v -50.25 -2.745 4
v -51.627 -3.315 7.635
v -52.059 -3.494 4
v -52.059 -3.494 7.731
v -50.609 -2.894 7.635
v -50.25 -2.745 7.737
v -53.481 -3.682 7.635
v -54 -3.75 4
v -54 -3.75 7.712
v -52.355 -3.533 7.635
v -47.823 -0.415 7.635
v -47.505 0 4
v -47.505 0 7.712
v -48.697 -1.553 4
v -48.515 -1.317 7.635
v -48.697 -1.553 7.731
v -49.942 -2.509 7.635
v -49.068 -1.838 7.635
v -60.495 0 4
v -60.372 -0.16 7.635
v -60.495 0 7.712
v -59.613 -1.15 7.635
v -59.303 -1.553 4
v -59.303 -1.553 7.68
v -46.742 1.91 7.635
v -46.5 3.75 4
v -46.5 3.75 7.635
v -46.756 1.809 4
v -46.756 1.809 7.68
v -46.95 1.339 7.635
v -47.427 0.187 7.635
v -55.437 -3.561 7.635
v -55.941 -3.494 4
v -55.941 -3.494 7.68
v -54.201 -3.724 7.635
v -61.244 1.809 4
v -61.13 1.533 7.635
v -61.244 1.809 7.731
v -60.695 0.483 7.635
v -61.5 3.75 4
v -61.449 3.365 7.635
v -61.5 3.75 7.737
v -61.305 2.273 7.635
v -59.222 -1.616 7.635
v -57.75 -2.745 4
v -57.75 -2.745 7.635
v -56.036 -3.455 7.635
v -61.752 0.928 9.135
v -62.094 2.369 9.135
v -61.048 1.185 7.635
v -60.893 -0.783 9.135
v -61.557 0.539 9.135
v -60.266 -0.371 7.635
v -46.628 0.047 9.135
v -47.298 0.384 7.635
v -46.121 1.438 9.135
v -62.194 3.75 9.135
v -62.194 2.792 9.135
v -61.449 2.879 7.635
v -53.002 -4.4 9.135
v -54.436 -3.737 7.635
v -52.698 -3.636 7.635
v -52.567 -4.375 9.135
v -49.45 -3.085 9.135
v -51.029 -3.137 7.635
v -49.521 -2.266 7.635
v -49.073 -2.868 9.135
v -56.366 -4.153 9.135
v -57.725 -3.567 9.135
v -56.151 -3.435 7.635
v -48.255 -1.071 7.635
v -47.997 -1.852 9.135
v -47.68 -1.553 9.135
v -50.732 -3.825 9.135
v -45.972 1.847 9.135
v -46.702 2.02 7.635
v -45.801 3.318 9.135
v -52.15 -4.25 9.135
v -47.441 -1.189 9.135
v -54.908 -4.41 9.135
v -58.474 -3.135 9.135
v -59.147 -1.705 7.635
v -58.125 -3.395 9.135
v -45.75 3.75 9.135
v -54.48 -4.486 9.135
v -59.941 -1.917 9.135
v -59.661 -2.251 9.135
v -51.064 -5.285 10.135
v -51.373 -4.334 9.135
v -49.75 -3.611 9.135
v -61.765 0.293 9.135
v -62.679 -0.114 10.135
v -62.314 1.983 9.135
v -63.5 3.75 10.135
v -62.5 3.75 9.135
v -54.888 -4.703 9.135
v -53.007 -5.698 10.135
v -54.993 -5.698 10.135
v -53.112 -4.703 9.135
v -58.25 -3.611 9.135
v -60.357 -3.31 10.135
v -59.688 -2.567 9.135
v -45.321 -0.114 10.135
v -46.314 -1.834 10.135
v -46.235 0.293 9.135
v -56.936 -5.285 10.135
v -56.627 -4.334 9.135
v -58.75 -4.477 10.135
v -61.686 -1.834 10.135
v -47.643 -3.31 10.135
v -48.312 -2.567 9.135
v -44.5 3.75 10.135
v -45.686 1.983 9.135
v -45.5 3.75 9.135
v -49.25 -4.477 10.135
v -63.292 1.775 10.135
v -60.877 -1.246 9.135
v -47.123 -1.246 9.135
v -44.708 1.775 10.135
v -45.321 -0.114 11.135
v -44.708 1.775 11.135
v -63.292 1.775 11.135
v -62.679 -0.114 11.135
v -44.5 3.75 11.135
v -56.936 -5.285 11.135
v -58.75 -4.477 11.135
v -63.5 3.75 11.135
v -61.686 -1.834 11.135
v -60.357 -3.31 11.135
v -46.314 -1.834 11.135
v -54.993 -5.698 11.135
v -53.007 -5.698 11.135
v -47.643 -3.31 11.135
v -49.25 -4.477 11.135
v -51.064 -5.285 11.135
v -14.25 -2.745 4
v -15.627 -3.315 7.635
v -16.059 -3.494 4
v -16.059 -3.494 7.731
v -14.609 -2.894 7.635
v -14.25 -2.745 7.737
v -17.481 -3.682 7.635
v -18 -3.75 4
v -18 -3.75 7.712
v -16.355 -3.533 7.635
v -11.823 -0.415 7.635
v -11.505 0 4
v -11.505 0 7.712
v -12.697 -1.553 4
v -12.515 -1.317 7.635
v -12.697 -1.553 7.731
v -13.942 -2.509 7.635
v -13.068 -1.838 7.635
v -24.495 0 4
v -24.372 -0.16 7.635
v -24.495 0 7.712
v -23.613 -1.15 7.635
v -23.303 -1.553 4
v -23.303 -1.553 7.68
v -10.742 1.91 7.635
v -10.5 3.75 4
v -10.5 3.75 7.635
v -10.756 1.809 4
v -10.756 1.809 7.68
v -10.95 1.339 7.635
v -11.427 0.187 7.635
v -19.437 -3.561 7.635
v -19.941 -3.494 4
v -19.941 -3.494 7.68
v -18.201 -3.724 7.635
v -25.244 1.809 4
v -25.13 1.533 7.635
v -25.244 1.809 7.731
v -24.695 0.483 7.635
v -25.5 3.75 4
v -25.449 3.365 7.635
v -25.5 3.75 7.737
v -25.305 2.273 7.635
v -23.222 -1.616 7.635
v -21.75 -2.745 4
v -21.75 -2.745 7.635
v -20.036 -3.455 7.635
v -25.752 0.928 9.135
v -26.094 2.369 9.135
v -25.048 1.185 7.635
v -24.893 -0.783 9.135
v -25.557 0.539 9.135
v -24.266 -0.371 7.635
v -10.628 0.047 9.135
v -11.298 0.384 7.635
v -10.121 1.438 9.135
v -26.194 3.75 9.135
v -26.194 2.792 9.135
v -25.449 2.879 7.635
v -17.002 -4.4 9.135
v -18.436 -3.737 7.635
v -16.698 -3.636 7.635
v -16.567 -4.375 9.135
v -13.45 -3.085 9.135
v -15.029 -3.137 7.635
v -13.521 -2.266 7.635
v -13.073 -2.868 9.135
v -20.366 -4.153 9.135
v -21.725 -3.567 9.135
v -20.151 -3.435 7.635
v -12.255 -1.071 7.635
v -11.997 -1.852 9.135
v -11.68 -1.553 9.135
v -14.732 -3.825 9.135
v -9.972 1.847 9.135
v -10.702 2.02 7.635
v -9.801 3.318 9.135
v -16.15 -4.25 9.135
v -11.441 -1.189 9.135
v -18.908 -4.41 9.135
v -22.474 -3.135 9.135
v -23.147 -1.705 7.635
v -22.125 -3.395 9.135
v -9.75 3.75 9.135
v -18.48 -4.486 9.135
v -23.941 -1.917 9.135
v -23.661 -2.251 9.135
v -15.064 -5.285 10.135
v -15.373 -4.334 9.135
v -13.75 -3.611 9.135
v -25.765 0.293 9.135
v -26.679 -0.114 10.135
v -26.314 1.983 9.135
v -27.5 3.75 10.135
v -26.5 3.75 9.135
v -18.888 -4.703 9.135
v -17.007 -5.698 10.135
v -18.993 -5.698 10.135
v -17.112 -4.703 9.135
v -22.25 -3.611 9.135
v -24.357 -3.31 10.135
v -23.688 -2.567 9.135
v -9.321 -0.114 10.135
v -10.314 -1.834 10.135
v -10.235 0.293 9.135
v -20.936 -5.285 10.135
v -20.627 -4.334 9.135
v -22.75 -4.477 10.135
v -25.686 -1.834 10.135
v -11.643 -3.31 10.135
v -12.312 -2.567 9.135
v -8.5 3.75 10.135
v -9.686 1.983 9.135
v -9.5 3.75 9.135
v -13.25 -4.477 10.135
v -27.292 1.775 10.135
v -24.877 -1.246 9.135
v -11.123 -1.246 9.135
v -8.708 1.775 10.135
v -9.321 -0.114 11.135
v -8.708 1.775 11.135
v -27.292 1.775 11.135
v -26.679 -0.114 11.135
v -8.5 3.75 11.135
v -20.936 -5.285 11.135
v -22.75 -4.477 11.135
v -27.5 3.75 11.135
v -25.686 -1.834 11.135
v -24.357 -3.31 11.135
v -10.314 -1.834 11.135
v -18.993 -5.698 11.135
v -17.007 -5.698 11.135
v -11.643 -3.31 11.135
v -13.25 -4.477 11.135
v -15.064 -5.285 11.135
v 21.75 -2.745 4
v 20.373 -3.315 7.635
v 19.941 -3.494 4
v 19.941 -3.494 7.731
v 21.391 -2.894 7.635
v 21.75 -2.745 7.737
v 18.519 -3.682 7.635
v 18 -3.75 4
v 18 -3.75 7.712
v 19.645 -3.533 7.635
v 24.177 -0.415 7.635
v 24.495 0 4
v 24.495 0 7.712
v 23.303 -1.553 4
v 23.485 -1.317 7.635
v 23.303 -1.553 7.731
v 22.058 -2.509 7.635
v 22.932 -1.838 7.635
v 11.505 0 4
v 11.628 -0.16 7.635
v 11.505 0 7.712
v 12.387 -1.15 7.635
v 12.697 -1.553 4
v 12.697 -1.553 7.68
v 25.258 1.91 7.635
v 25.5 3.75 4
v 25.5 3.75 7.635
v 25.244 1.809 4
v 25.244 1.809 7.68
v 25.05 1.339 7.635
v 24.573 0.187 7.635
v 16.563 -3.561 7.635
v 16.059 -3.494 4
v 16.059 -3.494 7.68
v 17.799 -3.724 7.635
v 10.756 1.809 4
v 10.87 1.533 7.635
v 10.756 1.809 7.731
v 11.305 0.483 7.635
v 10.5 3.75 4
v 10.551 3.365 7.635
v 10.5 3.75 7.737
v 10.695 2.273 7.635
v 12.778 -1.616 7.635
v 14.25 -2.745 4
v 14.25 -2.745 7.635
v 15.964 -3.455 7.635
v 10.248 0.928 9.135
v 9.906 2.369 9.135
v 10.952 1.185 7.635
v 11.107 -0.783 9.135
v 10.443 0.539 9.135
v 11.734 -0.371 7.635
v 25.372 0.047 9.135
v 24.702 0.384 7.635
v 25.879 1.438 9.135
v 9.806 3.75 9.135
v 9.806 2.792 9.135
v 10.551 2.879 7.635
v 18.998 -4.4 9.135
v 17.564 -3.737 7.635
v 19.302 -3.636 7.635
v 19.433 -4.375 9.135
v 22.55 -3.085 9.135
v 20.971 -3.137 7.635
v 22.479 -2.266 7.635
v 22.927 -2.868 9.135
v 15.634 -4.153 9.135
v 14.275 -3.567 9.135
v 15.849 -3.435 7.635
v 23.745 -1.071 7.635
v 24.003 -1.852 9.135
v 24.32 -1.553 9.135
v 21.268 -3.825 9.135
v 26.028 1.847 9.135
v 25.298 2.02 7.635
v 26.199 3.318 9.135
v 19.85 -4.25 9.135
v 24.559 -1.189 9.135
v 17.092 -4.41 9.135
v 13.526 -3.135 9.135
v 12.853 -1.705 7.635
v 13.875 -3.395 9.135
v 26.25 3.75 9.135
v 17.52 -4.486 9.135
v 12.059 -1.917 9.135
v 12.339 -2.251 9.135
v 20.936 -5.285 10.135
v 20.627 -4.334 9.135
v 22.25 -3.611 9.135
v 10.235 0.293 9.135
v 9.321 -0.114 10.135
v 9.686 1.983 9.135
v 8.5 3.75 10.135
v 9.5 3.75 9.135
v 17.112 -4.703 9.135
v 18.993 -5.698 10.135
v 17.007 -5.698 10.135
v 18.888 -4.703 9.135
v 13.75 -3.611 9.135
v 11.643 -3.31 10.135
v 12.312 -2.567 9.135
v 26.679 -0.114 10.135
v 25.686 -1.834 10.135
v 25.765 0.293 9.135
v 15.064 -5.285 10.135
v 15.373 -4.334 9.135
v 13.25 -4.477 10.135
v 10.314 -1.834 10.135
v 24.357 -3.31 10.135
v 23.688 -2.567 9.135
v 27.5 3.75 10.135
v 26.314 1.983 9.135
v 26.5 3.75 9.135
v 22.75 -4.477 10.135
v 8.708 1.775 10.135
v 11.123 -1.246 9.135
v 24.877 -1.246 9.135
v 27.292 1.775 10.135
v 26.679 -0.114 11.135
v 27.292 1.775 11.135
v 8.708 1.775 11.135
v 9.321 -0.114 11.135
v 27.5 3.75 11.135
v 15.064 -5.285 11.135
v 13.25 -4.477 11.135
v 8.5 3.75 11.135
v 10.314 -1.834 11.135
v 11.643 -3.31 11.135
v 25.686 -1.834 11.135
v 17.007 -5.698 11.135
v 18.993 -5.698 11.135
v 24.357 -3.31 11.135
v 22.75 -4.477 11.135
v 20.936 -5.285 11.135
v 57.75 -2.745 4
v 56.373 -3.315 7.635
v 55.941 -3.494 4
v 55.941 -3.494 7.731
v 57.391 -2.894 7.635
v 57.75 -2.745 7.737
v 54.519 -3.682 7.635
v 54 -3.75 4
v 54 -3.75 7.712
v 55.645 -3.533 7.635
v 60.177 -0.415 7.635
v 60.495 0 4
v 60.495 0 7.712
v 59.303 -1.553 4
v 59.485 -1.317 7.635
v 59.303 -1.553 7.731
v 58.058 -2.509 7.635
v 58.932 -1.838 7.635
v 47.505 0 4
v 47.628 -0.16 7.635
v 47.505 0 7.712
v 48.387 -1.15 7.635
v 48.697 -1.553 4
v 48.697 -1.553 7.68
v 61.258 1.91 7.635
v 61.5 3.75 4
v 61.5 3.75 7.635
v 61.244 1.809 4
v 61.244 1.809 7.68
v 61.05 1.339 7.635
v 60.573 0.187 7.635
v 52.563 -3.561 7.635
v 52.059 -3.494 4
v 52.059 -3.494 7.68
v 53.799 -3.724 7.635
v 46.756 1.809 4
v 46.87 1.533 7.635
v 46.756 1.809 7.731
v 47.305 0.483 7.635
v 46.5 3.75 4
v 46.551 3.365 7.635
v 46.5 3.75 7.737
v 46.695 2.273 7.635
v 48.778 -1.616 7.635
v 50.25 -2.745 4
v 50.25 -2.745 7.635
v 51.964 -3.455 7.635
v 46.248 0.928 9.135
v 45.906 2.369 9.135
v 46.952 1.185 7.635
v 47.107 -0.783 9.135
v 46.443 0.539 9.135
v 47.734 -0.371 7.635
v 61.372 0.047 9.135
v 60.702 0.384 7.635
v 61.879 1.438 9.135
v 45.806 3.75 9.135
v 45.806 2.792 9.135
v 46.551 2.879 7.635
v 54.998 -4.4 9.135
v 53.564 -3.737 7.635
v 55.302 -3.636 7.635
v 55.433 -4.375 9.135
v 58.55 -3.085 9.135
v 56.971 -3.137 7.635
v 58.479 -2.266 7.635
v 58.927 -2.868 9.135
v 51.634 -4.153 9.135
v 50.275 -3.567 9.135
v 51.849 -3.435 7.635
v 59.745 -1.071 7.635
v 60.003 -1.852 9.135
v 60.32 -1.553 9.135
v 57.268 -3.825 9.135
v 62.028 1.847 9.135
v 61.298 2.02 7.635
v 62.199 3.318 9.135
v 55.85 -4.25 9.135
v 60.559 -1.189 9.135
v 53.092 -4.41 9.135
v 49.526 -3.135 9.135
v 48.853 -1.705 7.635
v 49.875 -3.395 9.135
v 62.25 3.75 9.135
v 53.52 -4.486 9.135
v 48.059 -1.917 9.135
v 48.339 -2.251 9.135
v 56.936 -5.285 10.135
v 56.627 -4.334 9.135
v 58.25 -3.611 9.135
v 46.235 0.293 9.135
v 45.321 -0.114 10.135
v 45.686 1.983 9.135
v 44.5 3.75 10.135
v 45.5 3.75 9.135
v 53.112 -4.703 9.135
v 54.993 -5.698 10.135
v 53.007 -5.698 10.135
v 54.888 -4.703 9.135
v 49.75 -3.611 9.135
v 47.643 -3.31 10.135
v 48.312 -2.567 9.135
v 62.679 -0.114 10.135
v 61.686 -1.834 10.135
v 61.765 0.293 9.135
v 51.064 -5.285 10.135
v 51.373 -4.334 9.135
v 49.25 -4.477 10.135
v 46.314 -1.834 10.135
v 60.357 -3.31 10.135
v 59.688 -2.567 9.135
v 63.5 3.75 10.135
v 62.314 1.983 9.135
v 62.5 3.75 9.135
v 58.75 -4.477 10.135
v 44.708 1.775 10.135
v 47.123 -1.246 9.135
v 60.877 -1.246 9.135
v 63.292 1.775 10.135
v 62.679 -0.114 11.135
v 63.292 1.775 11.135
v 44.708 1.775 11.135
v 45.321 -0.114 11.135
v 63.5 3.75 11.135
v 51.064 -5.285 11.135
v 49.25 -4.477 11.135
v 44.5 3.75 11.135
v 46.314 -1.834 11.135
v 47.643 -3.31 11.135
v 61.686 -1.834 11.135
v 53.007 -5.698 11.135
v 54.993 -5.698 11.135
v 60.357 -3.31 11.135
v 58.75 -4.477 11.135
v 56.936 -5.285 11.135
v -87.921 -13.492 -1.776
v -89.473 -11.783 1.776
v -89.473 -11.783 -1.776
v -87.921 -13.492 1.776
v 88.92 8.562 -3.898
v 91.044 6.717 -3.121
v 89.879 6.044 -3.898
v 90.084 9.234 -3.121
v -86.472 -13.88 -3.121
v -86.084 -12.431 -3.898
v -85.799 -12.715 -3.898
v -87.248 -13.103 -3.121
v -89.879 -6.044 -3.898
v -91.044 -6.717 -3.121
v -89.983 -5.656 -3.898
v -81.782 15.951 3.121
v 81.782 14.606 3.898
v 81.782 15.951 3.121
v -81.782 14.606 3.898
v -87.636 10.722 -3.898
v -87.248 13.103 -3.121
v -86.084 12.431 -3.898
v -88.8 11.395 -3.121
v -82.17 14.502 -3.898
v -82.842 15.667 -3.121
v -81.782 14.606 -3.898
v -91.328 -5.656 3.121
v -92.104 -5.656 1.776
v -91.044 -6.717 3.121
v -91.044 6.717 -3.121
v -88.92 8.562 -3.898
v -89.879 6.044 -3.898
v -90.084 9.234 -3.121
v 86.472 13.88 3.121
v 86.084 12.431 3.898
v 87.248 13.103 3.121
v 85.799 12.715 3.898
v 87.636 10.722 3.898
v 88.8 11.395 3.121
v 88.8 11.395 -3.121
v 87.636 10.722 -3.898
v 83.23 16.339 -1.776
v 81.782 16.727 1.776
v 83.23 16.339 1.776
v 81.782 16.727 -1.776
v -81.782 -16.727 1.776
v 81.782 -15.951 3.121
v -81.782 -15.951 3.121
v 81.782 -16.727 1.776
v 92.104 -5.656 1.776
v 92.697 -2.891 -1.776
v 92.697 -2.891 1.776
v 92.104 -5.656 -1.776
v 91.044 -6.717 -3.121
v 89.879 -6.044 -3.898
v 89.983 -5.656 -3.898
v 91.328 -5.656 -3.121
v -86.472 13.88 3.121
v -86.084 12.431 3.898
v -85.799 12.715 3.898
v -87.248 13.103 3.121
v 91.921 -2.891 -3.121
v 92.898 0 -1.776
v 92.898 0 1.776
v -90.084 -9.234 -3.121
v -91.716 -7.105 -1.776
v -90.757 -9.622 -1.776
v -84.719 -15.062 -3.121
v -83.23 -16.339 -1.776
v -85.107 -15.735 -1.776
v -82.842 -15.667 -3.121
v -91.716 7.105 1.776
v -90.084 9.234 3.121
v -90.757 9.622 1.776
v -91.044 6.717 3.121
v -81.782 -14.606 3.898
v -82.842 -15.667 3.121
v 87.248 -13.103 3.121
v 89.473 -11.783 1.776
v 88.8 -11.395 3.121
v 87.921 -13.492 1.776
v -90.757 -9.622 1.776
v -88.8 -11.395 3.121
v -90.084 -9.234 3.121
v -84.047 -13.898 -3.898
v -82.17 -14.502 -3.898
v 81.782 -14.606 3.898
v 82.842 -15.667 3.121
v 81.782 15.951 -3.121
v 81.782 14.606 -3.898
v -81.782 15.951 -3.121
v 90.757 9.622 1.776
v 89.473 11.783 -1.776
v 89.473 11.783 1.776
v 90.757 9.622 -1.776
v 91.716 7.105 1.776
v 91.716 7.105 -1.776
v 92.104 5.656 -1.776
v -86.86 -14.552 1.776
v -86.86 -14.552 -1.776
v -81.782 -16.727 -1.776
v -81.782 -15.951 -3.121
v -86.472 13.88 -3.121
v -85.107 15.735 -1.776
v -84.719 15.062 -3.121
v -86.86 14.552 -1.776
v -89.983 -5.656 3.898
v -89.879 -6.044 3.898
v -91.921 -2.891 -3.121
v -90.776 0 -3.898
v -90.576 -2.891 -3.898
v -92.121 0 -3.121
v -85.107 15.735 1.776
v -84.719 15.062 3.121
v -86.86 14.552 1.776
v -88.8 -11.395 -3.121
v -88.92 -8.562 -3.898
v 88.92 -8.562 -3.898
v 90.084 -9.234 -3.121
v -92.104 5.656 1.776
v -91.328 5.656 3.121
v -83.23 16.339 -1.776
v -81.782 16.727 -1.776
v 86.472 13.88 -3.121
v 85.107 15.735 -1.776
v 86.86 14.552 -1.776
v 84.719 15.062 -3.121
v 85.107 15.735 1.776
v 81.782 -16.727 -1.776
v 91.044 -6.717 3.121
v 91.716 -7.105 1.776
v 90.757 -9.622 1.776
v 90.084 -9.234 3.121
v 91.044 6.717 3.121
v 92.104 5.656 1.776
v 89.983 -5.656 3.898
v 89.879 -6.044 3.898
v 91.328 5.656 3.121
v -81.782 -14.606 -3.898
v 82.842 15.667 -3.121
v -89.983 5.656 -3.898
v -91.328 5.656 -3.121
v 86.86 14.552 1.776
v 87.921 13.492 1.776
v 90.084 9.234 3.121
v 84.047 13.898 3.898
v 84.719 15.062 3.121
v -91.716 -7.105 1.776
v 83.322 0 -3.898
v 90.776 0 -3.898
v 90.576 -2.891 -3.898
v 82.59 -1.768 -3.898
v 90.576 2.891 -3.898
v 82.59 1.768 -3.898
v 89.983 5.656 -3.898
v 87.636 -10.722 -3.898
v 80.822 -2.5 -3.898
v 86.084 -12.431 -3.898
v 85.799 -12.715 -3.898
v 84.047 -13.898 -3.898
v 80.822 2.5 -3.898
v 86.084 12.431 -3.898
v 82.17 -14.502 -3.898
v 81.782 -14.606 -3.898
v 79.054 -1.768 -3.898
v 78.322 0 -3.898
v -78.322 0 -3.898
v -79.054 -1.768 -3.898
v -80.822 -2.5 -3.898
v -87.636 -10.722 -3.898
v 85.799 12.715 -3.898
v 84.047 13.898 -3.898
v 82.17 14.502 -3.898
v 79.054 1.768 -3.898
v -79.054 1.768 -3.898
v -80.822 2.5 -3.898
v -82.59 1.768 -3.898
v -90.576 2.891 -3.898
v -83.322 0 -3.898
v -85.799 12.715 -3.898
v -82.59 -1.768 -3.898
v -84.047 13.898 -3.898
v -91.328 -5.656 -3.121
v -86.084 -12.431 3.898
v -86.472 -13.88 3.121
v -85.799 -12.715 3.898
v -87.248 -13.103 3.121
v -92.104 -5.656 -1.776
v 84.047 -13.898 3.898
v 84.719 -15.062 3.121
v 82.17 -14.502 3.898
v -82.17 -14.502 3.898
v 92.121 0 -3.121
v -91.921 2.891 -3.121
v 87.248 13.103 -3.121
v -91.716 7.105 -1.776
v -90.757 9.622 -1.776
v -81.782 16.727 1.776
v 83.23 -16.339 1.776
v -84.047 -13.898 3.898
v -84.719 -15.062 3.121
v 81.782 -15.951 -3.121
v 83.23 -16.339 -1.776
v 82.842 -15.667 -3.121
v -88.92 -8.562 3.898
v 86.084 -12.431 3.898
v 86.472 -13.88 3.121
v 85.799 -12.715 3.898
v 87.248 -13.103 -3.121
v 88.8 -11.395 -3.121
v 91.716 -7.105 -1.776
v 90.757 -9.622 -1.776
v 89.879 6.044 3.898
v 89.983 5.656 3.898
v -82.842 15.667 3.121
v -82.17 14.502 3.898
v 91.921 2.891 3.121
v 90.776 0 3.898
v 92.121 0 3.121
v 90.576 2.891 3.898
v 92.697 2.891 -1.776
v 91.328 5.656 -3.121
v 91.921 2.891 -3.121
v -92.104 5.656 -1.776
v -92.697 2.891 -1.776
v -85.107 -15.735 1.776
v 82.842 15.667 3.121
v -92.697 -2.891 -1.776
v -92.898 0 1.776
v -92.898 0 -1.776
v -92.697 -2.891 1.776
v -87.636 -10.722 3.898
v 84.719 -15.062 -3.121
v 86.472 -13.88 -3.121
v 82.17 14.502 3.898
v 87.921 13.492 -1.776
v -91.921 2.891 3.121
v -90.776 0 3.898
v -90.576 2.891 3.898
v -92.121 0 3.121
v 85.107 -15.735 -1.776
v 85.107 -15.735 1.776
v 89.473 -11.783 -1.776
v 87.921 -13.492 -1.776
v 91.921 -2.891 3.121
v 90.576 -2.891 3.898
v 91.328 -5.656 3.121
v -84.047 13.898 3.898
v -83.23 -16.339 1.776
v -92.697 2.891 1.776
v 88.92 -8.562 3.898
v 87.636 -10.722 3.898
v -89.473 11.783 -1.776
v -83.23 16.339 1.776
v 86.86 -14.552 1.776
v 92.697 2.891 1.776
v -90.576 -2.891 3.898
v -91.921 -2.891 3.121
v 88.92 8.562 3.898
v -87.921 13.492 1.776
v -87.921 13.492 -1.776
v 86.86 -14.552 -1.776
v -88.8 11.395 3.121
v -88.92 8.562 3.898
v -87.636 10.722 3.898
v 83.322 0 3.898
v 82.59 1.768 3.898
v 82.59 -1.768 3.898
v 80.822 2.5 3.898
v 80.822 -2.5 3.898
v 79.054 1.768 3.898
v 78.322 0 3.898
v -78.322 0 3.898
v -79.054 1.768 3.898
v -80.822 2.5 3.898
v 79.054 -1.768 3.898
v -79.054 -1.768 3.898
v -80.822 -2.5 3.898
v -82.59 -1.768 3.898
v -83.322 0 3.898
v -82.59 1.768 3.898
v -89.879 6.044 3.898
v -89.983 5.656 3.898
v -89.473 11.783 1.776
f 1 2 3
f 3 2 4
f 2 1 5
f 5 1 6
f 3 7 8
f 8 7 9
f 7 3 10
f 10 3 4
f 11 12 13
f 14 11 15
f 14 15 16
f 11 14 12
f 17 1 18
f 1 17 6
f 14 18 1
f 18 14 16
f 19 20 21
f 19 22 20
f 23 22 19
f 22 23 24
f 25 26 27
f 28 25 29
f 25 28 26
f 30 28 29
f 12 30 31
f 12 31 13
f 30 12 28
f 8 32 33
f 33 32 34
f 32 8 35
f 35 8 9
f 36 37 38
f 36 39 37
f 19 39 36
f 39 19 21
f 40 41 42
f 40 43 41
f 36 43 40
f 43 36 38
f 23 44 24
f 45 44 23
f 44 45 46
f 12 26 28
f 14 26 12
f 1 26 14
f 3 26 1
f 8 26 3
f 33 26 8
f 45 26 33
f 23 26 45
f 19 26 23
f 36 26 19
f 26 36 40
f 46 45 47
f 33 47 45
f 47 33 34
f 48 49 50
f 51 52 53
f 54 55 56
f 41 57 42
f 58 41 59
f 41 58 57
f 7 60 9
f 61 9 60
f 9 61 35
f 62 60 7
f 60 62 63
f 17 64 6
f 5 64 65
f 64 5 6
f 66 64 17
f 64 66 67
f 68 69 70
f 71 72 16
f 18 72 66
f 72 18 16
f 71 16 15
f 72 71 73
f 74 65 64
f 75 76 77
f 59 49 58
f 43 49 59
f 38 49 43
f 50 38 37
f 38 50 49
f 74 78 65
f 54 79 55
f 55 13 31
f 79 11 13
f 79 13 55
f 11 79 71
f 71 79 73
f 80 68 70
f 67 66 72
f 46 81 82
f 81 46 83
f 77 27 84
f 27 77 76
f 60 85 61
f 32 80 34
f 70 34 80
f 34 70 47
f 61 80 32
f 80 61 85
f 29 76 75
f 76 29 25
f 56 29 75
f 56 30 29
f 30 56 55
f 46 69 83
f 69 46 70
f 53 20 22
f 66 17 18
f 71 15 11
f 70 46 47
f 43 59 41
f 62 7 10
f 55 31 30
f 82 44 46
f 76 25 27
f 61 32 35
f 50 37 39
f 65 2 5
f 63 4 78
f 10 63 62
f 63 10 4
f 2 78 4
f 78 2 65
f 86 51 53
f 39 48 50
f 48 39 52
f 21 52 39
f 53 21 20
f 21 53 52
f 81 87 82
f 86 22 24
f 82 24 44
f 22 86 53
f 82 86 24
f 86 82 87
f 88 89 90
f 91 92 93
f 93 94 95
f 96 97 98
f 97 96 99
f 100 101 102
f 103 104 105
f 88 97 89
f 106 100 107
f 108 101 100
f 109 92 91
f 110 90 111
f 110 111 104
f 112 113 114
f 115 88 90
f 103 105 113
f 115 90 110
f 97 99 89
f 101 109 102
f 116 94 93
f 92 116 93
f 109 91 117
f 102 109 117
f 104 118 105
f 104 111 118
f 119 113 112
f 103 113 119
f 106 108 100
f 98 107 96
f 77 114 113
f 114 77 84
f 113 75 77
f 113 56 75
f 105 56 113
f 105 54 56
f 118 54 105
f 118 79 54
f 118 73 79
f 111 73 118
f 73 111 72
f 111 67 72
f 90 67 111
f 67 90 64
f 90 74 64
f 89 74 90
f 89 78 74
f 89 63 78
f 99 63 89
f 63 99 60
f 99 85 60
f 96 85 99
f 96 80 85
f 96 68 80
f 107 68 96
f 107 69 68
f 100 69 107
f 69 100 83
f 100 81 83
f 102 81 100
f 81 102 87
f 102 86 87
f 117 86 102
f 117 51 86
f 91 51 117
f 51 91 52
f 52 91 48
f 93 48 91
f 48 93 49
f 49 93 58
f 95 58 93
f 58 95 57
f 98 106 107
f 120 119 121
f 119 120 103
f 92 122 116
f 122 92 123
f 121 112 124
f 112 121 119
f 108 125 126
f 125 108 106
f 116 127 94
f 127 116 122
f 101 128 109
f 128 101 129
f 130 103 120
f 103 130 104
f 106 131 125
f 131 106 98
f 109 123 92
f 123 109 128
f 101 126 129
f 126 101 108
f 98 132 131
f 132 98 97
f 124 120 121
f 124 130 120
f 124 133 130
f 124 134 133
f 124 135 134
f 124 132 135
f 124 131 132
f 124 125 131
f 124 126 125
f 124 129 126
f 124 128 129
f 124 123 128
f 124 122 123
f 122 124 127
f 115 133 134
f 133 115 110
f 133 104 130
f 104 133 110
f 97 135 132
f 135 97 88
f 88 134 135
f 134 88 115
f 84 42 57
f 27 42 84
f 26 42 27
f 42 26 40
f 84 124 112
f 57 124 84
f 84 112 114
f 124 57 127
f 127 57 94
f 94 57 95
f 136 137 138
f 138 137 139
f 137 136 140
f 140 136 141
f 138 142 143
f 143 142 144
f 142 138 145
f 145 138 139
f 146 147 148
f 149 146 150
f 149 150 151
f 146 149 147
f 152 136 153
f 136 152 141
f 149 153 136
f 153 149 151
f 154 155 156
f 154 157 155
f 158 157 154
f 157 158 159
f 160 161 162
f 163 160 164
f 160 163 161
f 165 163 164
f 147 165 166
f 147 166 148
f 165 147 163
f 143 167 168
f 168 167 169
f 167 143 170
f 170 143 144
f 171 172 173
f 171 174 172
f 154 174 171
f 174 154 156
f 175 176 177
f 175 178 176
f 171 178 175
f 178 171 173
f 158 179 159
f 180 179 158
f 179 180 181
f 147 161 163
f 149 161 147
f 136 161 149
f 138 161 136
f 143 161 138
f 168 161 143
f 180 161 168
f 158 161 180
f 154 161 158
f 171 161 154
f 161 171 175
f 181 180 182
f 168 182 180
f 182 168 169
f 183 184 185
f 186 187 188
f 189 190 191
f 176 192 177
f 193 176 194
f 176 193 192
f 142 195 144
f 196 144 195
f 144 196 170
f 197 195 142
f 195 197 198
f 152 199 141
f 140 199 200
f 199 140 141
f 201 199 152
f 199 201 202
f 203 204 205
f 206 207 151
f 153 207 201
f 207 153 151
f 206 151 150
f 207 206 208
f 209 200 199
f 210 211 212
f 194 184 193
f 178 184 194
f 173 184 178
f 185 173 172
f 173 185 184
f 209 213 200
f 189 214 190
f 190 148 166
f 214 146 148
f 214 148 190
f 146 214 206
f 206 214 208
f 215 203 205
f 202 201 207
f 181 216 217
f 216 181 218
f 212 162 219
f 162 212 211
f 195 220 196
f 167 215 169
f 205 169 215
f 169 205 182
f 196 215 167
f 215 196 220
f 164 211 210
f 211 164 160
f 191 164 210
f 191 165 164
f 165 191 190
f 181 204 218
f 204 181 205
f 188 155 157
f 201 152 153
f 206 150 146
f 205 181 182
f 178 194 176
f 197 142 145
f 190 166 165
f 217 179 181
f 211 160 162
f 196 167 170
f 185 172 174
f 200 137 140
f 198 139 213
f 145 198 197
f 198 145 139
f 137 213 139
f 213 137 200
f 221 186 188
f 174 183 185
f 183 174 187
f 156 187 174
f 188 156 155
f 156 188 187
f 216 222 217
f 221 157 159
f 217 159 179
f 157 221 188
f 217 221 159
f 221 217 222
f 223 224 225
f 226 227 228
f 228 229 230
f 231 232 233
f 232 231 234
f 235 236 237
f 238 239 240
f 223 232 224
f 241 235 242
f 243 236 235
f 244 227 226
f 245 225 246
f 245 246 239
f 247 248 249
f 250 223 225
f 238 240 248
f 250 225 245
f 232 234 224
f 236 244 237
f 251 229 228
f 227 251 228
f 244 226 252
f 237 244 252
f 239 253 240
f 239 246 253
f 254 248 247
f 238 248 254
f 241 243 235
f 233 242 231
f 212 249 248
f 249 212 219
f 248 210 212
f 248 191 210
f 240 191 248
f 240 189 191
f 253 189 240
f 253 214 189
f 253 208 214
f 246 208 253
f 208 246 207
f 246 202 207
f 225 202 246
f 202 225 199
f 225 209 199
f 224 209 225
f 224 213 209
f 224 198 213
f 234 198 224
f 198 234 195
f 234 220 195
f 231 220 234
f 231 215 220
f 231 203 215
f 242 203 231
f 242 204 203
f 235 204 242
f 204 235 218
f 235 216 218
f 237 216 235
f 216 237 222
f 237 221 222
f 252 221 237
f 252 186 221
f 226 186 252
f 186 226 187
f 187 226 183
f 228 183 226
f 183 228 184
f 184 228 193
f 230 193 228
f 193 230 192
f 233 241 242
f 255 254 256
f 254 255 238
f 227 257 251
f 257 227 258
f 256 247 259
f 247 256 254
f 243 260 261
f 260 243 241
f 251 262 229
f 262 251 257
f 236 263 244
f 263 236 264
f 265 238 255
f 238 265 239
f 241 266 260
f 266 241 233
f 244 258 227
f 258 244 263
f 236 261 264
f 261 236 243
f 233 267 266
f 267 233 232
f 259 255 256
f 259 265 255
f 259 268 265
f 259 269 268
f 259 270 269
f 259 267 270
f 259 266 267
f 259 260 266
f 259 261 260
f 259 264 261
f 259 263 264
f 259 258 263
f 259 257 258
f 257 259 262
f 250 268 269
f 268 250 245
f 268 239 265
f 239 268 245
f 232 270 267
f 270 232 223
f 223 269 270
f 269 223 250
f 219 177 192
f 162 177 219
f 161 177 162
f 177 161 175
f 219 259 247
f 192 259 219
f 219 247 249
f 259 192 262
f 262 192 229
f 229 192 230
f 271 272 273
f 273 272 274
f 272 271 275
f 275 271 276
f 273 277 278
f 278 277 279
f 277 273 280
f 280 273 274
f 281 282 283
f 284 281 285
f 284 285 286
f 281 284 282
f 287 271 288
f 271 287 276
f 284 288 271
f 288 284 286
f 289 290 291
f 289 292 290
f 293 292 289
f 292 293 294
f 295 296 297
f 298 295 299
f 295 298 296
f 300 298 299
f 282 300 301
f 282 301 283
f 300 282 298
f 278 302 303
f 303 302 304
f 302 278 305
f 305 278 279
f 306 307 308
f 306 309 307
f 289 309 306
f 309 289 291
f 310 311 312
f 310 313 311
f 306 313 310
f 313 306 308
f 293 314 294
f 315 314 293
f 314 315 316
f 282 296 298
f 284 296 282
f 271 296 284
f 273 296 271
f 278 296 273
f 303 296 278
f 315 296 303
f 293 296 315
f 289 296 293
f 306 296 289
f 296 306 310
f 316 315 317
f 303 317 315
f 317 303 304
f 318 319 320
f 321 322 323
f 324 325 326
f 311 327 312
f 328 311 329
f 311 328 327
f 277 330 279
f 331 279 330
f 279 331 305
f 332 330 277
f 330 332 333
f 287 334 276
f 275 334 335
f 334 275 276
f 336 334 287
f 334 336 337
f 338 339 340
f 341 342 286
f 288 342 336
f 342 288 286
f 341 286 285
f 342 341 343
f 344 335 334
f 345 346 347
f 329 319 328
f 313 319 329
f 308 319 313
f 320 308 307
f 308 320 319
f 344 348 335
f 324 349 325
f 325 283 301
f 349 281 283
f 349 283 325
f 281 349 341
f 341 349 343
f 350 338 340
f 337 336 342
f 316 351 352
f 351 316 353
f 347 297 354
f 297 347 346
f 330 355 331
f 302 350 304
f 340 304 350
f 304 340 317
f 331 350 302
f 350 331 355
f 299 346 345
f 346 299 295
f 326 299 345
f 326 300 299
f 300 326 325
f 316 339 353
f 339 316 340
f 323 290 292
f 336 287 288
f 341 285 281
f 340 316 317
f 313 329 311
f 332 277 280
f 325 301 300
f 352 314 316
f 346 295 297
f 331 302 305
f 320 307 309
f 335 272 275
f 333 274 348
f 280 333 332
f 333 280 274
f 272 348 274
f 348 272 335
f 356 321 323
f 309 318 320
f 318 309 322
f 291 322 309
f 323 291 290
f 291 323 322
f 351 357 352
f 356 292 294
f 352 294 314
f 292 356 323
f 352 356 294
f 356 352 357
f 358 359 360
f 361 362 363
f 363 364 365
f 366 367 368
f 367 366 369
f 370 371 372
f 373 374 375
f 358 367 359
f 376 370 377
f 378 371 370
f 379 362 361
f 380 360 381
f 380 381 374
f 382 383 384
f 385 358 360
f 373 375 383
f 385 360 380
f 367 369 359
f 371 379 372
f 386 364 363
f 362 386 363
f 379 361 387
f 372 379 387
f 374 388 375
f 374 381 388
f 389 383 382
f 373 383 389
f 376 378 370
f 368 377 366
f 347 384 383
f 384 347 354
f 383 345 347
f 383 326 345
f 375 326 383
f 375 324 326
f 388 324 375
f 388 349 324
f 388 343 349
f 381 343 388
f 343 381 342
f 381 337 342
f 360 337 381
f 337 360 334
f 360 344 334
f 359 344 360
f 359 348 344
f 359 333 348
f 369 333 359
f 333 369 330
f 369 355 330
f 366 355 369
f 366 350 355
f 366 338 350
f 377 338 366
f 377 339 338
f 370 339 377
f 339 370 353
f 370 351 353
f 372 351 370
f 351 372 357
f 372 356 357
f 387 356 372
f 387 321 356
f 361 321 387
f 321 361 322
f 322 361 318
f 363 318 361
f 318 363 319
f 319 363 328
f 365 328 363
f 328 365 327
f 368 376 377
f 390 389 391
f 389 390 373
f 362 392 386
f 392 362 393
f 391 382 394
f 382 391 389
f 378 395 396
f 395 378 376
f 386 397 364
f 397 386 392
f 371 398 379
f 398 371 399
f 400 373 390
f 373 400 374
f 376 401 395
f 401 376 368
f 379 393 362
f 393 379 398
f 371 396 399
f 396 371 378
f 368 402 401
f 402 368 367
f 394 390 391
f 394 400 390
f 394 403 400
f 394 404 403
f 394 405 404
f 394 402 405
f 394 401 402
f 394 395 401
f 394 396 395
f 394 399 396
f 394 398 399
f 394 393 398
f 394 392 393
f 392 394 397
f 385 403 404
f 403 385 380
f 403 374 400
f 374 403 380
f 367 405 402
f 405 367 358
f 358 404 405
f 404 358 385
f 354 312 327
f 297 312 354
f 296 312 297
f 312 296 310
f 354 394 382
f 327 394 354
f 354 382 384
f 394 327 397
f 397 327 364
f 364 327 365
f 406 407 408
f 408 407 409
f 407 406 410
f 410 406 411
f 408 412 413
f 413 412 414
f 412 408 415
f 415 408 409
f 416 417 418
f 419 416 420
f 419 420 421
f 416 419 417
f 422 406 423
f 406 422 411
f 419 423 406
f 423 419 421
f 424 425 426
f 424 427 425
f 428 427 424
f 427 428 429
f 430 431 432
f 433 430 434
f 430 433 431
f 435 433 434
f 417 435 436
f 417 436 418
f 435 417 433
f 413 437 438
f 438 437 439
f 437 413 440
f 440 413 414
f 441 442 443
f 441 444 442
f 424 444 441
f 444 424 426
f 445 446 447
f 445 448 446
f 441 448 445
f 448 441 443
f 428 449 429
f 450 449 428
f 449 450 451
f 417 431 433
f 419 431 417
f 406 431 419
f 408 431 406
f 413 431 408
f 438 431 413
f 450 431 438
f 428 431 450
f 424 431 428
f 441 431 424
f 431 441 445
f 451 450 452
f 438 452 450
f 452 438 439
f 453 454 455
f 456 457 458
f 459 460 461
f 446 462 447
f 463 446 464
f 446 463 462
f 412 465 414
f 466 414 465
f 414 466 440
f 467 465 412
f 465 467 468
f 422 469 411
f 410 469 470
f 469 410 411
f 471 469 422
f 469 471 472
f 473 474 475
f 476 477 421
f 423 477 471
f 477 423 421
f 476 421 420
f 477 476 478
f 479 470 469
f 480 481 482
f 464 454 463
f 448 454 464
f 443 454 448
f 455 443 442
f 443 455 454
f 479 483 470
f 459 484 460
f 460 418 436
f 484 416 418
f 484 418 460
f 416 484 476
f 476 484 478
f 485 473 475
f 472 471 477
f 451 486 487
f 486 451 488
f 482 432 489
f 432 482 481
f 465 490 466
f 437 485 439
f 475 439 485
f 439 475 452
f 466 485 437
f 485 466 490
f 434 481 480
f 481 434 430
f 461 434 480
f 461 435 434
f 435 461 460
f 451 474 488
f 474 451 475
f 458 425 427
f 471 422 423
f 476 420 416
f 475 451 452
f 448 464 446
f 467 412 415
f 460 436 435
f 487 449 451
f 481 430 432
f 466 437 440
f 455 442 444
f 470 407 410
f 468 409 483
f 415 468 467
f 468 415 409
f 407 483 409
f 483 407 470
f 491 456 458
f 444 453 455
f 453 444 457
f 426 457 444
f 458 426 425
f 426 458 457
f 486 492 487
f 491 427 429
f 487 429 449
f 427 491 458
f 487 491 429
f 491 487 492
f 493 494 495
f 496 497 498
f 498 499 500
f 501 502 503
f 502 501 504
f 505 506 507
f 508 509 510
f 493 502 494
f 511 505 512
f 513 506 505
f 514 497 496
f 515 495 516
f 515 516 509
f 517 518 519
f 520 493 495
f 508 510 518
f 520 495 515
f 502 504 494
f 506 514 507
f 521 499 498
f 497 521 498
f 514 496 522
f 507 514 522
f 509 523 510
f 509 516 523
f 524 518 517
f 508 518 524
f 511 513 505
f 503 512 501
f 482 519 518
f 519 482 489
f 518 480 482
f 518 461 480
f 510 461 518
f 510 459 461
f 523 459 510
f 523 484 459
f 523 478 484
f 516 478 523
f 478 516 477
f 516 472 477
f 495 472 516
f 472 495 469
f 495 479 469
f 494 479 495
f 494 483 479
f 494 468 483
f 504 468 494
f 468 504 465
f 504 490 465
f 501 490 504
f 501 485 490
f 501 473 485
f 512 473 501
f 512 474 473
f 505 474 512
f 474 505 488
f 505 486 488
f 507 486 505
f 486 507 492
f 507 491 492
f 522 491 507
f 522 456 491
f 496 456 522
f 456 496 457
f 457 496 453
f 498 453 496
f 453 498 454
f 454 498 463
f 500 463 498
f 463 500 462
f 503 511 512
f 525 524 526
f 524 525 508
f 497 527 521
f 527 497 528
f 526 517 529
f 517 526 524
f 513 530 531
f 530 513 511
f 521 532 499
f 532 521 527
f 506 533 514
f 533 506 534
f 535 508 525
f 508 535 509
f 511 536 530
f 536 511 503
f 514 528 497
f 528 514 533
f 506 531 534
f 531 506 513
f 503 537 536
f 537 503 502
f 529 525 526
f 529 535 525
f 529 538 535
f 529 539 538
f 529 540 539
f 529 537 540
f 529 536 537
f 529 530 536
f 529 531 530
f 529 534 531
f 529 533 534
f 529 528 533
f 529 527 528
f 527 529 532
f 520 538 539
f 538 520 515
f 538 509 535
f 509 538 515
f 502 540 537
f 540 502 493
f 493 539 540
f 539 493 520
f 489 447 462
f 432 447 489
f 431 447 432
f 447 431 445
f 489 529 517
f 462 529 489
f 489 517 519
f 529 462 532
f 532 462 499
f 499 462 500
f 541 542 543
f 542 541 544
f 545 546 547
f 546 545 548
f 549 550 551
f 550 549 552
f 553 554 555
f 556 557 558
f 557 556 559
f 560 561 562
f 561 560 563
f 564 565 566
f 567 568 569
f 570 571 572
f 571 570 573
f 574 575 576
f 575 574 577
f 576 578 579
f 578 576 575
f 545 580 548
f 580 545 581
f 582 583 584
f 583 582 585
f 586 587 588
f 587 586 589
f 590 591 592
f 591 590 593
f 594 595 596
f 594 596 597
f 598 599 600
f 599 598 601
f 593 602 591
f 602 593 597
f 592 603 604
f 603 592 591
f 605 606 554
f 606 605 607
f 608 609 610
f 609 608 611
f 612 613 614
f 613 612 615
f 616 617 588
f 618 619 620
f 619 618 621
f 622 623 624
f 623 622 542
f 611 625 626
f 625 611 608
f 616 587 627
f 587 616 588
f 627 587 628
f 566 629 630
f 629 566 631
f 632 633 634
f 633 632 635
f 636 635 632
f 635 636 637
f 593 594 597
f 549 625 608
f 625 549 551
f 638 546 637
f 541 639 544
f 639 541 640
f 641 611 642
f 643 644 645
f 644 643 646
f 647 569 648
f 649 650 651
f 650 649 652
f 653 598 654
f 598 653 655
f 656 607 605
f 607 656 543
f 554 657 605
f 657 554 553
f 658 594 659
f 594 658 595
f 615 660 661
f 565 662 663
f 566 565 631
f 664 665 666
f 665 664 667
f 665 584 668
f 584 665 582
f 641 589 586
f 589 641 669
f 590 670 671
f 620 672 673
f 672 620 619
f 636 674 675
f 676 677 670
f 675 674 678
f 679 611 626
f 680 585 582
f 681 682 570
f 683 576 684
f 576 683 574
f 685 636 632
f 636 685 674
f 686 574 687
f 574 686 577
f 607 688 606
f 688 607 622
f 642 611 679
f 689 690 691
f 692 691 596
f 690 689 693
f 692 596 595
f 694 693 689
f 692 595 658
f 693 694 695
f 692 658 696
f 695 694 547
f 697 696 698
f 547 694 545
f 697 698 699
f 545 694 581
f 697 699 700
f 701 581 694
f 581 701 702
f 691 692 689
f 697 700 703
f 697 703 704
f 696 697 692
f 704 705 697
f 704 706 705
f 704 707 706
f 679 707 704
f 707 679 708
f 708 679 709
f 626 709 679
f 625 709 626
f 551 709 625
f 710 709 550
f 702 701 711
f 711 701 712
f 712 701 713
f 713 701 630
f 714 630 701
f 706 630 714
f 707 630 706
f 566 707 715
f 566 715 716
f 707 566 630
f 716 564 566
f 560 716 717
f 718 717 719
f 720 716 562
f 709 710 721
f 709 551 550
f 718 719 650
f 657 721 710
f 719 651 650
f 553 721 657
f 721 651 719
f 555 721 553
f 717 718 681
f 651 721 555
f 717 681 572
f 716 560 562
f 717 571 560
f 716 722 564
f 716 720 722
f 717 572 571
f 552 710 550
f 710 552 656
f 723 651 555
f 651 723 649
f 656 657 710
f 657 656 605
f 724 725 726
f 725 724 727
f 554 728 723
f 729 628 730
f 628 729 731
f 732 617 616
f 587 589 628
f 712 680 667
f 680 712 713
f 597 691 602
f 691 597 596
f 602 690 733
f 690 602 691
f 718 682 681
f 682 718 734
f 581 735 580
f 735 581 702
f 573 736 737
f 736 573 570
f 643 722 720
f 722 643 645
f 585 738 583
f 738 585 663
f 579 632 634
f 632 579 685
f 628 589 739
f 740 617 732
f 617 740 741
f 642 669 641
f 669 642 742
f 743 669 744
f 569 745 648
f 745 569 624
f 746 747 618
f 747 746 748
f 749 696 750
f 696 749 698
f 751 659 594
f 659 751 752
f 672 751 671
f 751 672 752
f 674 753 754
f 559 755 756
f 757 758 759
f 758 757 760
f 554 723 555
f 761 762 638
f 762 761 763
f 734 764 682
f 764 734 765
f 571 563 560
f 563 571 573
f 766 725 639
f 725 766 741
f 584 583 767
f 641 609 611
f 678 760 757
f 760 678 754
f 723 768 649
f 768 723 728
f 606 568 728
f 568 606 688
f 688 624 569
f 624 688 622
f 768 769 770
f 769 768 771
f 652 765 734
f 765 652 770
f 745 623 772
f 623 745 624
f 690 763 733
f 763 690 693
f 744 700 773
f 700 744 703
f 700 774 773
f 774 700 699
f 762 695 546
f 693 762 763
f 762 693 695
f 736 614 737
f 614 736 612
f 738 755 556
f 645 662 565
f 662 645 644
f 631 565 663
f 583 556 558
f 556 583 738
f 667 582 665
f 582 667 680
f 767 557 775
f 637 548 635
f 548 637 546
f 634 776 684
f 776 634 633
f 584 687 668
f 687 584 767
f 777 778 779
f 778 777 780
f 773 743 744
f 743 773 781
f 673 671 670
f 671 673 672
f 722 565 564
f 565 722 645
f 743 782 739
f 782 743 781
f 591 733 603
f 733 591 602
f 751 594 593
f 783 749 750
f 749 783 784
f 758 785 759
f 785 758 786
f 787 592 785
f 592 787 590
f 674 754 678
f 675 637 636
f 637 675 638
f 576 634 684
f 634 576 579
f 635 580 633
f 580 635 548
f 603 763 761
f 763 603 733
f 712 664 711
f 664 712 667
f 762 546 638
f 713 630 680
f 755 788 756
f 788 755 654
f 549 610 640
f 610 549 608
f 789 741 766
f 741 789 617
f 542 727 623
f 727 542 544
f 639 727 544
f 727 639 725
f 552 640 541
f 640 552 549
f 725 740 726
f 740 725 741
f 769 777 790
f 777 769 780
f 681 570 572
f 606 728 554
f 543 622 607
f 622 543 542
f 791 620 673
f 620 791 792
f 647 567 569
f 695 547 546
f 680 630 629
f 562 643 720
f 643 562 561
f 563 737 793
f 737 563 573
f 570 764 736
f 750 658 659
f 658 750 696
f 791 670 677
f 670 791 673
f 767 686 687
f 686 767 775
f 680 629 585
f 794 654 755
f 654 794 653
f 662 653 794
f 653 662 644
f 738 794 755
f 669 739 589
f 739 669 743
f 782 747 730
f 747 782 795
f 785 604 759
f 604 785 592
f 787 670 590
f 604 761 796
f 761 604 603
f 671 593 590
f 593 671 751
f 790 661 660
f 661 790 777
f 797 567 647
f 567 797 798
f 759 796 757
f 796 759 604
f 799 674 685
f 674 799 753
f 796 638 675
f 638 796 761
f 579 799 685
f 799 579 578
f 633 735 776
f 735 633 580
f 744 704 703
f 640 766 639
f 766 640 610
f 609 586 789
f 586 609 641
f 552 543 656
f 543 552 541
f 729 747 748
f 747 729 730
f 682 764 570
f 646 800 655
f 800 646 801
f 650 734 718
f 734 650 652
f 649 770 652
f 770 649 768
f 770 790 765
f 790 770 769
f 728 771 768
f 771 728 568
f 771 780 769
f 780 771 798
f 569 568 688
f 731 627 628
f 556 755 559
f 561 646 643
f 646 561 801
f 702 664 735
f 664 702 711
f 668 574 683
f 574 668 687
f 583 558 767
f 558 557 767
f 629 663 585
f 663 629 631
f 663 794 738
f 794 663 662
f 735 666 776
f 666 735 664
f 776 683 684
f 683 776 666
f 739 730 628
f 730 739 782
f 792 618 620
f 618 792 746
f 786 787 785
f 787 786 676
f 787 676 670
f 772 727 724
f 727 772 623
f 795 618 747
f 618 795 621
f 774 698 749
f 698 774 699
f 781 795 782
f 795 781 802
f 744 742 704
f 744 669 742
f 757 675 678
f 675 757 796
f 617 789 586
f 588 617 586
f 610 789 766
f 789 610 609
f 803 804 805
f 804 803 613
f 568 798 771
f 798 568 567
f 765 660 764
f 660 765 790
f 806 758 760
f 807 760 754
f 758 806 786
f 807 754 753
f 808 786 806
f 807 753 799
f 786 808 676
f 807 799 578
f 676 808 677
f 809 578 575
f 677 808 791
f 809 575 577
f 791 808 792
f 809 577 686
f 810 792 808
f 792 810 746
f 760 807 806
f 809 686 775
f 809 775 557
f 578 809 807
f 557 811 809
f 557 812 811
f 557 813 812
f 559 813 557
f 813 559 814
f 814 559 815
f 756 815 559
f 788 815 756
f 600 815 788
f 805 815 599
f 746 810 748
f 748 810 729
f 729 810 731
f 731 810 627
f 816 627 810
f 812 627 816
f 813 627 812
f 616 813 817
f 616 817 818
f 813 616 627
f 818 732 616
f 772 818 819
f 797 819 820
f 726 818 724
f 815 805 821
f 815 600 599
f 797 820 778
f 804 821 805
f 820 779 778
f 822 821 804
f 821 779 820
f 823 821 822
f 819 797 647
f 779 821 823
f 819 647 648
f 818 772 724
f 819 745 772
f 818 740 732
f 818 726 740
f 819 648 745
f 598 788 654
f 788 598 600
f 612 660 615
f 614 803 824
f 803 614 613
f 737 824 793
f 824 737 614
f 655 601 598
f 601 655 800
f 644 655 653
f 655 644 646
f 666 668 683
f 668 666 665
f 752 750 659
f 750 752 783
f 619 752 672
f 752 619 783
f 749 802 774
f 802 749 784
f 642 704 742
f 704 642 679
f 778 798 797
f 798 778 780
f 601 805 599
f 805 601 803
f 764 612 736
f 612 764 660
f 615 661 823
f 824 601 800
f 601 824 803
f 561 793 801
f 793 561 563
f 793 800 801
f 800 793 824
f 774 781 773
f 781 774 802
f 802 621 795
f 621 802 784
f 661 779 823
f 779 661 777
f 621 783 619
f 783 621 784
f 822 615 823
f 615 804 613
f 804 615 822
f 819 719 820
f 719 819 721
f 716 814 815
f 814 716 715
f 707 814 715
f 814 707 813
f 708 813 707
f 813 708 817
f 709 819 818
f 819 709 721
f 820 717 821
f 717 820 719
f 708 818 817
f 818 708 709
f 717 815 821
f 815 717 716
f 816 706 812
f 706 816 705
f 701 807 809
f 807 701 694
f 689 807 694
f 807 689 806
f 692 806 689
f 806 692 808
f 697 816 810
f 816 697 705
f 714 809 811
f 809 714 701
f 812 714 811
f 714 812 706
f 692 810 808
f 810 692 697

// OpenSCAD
golden = 1.61803399;
w = 180;
h = w/golden/4;
d = 8;
hook_r = 7.5;

//%cube([w, h, d], center=true);

module plate(w, h, d, end_squish=0.66) {
	difference() {
		minkowski() {
			linear_extrude(height=d-6, center=true) {
				hull() {
					translate([-w/2+end_squish*h/2,0,0])
						scale([end_squish,1,1])
							circle(h/2);
					translate([w/2-end_squish*h/2,0,0])
						scale([end_squish,1,1])
							circle(h/2);
				}
			}
			sphere(r=3,$fn=12);
		}

		translate([-w/2+end_squish*h/2,0,0])
			cylinder(r=2.5,h=d*2,center=true);

		translate([w/2-end_squish*h/2,0,0])
			cylinder(r=2.5,h=d*2,center=true);
	}
}

module hook(d, r) {
	difference() {
		union() {
			translate([0,0,0])
				cylinder(r=r,h=d,center=true);
			translate([0,0,d/2])
				cylinder(r1=r,r2=r+1,h=2,center=true);
			translate([0,0,d/2+1])
				cylinder(r1=r+1,r2=r+2,h=1,center=true);
			translate([0,0,d/2+1.5])
				cylinder(r1=r+1,r2=r+2,h=1,center=true);
			translate([0,0,d/2+2])
				cylinder(r=r+2,h=1,center=true);
		}
		translate([-r*3/2,0,-d*3/2])
			cube([r*3,r*3,d*3]);
	}
}

hook_d = hook_r/golden;

union() {
	translate([0,hook_r/2,hook_d/2+4]) {

		translate([-w/2+w/5*1,0,0])
			hook(hook_d, hook_r);

		translate([-w/2+w/5*2,0,0])
			hook(hook_d, hook_r);

		translate([-w/2+w/5*3,0,0])
			hook(hook_d, hook_r);

		translate([-w/2+w/5*4,0,0])
			hook(hook_d, hook_r);

	}

	plate(w,h,d);	
}
// hook(hook_d, hook_r);
